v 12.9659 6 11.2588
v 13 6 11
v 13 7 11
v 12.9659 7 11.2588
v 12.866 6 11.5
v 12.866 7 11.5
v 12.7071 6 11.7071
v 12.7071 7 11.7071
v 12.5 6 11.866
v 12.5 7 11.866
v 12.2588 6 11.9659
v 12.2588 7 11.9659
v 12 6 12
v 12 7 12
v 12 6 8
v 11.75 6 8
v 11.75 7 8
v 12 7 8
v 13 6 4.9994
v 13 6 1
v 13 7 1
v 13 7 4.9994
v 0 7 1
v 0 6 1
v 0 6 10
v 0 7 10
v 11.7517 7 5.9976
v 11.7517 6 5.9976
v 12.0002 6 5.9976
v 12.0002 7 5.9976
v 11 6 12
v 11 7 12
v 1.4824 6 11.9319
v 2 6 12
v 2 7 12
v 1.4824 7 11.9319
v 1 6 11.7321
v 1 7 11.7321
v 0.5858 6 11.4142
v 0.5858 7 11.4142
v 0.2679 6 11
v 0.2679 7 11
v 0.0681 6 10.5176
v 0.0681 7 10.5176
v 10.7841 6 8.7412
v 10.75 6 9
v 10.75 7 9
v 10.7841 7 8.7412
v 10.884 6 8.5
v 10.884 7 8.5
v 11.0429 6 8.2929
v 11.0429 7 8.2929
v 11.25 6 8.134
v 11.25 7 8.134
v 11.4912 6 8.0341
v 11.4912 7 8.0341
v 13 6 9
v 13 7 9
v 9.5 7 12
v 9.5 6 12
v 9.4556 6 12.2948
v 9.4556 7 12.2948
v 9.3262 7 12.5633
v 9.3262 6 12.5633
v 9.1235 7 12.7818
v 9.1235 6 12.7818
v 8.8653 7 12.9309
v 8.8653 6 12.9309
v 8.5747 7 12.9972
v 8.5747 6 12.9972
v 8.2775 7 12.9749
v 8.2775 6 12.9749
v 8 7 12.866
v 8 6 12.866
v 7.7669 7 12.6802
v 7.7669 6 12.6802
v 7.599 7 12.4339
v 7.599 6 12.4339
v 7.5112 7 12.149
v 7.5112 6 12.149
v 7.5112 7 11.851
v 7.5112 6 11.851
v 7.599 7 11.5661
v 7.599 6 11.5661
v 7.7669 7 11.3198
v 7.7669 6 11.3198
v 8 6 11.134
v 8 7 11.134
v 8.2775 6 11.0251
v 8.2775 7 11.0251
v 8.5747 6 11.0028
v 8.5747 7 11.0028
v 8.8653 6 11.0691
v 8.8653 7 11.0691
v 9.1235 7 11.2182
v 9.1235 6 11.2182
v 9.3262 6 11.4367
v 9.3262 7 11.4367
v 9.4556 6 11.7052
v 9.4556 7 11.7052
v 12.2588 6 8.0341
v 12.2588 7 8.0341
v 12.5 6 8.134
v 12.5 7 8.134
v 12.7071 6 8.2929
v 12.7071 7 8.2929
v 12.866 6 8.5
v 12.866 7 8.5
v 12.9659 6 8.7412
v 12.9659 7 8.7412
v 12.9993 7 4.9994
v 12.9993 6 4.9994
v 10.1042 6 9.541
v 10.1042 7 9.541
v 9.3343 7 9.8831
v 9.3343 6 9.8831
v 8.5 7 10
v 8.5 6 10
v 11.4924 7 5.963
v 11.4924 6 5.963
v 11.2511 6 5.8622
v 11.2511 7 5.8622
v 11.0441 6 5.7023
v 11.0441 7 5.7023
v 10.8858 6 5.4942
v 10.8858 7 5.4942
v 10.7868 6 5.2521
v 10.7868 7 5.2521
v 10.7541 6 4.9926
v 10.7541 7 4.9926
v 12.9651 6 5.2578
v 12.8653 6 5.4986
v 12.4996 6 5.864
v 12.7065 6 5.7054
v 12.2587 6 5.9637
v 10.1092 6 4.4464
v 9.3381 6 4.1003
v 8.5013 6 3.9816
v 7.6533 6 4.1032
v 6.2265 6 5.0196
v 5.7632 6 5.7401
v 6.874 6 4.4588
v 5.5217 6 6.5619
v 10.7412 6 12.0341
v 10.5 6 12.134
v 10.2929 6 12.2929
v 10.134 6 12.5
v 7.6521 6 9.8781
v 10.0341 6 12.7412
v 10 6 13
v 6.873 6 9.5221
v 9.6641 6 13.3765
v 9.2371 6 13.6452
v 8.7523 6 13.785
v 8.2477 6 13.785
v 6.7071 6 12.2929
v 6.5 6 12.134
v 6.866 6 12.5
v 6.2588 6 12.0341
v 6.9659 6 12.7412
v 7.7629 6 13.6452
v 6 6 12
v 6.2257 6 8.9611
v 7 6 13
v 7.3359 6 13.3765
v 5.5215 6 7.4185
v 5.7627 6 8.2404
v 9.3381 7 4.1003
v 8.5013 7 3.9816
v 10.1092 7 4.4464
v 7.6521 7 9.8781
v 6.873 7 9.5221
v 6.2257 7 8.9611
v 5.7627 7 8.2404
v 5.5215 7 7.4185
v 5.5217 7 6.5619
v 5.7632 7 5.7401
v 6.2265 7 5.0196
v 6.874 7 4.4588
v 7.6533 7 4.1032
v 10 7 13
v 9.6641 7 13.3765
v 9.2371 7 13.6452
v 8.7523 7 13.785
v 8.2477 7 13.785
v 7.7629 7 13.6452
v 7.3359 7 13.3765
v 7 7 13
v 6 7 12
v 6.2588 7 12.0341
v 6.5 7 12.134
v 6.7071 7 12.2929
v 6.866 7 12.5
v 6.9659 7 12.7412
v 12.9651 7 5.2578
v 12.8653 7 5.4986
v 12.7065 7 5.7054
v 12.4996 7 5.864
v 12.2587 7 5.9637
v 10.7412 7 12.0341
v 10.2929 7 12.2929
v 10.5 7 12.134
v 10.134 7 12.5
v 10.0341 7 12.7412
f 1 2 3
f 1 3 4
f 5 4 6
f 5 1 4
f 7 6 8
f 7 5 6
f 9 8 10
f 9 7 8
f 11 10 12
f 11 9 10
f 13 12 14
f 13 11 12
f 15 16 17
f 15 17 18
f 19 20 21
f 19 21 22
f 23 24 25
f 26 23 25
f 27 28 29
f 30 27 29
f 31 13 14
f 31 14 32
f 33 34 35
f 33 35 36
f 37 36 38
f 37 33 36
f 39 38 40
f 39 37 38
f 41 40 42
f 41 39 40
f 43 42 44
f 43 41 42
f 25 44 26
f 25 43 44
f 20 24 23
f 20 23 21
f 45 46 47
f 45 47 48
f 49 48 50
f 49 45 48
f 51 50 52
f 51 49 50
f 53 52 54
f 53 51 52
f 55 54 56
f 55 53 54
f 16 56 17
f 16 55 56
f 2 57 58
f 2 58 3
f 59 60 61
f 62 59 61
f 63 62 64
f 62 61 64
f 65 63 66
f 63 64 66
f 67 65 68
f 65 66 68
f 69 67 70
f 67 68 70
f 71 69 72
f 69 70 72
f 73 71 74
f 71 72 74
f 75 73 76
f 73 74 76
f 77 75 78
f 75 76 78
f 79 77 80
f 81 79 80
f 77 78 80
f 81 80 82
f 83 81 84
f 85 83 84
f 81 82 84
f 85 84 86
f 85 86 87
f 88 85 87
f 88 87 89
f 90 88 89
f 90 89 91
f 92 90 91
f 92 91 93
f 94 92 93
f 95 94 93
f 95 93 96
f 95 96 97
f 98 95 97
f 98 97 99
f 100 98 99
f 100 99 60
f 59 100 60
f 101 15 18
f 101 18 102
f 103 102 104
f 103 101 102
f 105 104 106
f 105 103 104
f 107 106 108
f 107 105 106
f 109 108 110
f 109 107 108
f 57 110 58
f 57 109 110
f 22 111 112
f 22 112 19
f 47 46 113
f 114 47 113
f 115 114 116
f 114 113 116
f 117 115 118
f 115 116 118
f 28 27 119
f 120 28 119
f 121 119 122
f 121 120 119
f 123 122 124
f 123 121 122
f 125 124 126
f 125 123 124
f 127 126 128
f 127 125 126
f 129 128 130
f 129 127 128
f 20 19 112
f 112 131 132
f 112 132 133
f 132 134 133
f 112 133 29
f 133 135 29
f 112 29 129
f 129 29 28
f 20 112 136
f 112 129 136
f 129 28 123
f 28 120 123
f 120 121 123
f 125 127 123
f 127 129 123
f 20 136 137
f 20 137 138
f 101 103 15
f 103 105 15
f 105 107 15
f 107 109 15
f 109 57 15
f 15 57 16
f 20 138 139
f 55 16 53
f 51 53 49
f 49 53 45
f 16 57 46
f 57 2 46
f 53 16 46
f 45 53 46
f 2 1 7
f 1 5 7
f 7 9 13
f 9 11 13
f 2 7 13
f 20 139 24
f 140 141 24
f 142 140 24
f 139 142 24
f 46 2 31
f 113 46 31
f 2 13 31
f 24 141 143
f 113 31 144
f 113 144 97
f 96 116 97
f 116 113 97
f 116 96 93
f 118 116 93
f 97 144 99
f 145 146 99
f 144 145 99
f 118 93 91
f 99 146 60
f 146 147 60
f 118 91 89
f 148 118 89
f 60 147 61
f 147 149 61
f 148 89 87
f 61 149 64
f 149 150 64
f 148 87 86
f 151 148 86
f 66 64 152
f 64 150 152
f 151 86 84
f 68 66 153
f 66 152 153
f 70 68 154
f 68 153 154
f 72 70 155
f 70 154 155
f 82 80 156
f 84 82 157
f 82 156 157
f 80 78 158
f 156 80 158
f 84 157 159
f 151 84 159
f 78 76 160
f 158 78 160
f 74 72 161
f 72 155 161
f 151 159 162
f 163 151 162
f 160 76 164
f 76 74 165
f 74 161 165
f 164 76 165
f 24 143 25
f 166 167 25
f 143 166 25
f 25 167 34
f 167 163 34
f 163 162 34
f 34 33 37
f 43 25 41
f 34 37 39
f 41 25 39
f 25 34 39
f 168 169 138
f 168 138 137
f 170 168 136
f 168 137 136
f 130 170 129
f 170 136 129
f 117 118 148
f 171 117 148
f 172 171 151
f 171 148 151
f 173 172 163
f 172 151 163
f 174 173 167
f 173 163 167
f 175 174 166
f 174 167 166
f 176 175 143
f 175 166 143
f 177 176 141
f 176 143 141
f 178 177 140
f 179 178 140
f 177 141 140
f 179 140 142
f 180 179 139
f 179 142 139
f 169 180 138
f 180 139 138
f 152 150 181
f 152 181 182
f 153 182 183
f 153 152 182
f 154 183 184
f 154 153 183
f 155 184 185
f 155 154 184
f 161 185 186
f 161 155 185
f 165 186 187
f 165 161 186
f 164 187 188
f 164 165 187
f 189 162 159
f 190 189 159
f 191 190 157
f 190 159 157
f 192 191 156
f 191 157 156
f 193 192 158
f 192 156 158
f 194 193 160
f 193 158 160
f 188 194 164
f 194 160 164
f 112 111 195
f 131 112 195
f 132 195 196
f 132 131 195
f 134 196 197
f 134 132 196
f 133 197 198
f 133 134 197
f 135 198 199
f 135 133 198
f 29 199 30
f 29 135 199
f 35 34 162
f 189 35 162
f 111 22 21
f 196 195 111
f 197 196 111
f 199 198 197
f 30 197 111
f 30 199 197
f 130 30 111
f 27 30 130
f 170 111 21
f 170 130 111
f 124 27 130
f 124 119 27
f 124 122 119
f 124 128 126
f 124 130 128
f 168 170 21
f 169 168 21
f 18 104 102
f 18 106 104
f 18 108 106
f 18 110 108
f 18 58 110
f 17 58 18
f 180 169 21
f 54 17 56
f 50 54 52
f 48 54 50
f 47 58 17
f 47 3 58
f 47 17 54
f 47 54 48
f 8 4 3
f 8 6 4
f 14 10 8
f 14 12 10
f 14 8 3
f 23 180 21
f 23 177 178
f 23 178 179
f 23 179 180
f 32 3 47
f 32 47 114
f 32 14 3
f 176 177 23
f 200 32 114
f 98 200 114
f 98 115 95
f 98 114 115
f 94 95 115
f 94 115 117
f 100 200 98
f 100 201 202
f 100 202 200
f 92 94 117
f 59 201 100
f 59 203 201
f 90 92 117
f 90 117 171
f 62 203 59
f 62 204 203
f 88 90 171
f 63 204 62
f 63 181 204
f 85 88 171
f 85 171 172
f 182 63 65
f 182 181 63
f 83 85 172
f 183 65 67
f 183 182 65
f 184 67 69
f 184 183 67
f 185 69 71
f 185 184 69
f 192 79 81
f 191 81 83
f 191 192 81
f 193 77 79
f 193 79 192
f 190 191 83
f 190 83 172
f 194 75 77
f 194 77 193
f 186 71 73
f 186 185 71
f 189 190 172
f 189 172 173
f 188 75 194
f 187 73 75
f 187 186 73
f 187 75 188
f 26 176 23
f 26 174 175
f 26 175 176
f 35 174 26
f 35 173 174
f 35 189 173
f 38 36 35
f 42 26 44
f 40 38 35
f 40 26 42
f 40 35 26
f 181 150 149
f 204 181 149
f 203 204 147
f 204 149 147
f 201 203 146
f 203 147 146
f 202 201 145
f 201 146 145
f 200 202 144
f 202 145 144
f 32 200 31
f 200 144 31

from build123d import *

# Parameters (mm, degrees)
EXTRUDE070_DEPTH                     = 5
EXTRUDE070_ONTO_SKETCH267_ROLL_ANGLE = 90
SKETCH268_AS_DRAWN_R                 = 1
EXTRUDE069_DEPTH                     = 10
EXTRUDE069_ONTO_SKETCH268_ROLL_ANGLE = 90
EXTRUDE071_DEPTH                     = 1
EXTRUDE071_ONTO_SKETCH266_ROLL_ANGLE = 90


with BuildPart() as extrude070:
    # Sketch267 as drawn → Extrude070 (new)
    with BuildSketch(Plane.XY):
        with BuildLine():
            ThreePointArc((8.500012, 10), (5.490931, 6.990186), (8.501267, 3.981628))
            ThreePointArc((8.501267, 3.981628), (9.735803, 4.24621), (10.754109, 4.992623))
            ThreePointArc((11.751661, 5.997636), (11.044132, 5.702333), (10.754109, 4.992623))
            Line((11.751661, 5.997636), (12.000229, 5.997636))
            ThreePointArc((12.999313, 4.999389), (12.706459, 5.705374), (12.000229, 5.997636))
            Line((12.999313, 4.999389), (15.5, 5))
            Line((15.5, 5), (15.5, 9))
            Line((13, 9), (15.5, 9))
            ThreePointArc((12, 8), (12.707107, 8.292893), (13, 9))
            Line((11.75, 8), (12, 8))
            ThreePointArc((10.75, 9), (11.042893, 8.292893), (11.75, 8))
            ThreePointArc((10.75, 9), (9.731212, 9.738962), (8.500012, 10))
        make_face()
    extrude(amount=-EXTRUDE070_DEPTH)


with BuildPart() as extrude070_1:
    # Extrude070 onto Sketch267 roll: moved
    add(extrude070.part.rotate(Axis((0, 0, 0), (1, 0, 0)), EXTRUDE070_ONTO_SKETCH267_ROLL_ANGLE))


with BuildPart() as extrude070_2:
    # Extrude070 onto Sketch267 placement: moved
    add(extrude070_1.part.moved(Location((0, 3, 0))))


with BuildPart() as extrude069:
    # Sketch268 as drawn → Extrude069 (new)
    with BuildSketch(Plane.XY):
        with Locations((8.5, 12)):
            Circle(SKETCH268_AS_DRAWN_R)
    extrude(amount=-EXTRUDE069_DEPTH)


with BuildPart() as extrude069_1:
    # Extrude069 onto Sketch268 roll: moved
    add(extrude069.part.rotate(Axis((0, 0, 0), (1, 0, 0)), EXTRUDE069_ONTO_SKETCH268_ROLL_ANGLE))


with BuildPart() as extrude069_2:
    # Extrude069 onto Sketch268 placement: moved
    add(extrude069_1.part.moved(Location((0, 4, 0))))


with BuildPart() as extrude069_3:
    # Extrude069 placement: moved
    add(extrude069_2.part.moved(Location((0, -2, 0))))


with BuildPart() as cut042:
    # Sketch266 as drawn → Extrude071 (new)
    with BuildSketch(Plane.XY):
        with BuildLine():
            Line((0, 1), (0, 10))
            ThreePointArc((2, 12), (0.585786, 11.414214), (0, 10))
            Line((2, 12), (6, 12))
            ThreePointArc((6, 12), (6.707107, 12.292893), (7, 13))
            ThreePointArc((10, 13.000001), (8.5, 13.802776), (7, 13))
            ThreePointArc((10, 13.000001), (10.292893, 12.292893), (11, 12))
            Line((12, 12), (11, 12))
            ThreePointArc((13, 11), (12.707107, 11.707107), (12, 12))
            Line((13, 1), (13, 11))
            Line((0, 1), (13, 1))
        make_face()
    extrude(amount=-EXTRUDE071_DEPTH)


with BuildPart() as cut042_1:
    # Extrude071 onto Sketch266 roll: moved
    add(cut042.part.rotate(Axis((0, 0, 0), (1, 0, 0)), EXTRUDE071_ONTO_SKETCH266_ROLL_ANGLE))


with BuildPart() as cut042_2:
    # Extrude071 onto Sketch266 placement: moved
    add(cut042_1.part.moved(Location((0, 6, 0))))

    # Cut041: cut Extrude069
    add(extrude069_3.part, mode=Mode.SUBTRACT)

    # Cut042: cut Extrude070
    add(extrude070_2.part, mode=Mode.SUBTRACT)


solid = cut042_2.part
